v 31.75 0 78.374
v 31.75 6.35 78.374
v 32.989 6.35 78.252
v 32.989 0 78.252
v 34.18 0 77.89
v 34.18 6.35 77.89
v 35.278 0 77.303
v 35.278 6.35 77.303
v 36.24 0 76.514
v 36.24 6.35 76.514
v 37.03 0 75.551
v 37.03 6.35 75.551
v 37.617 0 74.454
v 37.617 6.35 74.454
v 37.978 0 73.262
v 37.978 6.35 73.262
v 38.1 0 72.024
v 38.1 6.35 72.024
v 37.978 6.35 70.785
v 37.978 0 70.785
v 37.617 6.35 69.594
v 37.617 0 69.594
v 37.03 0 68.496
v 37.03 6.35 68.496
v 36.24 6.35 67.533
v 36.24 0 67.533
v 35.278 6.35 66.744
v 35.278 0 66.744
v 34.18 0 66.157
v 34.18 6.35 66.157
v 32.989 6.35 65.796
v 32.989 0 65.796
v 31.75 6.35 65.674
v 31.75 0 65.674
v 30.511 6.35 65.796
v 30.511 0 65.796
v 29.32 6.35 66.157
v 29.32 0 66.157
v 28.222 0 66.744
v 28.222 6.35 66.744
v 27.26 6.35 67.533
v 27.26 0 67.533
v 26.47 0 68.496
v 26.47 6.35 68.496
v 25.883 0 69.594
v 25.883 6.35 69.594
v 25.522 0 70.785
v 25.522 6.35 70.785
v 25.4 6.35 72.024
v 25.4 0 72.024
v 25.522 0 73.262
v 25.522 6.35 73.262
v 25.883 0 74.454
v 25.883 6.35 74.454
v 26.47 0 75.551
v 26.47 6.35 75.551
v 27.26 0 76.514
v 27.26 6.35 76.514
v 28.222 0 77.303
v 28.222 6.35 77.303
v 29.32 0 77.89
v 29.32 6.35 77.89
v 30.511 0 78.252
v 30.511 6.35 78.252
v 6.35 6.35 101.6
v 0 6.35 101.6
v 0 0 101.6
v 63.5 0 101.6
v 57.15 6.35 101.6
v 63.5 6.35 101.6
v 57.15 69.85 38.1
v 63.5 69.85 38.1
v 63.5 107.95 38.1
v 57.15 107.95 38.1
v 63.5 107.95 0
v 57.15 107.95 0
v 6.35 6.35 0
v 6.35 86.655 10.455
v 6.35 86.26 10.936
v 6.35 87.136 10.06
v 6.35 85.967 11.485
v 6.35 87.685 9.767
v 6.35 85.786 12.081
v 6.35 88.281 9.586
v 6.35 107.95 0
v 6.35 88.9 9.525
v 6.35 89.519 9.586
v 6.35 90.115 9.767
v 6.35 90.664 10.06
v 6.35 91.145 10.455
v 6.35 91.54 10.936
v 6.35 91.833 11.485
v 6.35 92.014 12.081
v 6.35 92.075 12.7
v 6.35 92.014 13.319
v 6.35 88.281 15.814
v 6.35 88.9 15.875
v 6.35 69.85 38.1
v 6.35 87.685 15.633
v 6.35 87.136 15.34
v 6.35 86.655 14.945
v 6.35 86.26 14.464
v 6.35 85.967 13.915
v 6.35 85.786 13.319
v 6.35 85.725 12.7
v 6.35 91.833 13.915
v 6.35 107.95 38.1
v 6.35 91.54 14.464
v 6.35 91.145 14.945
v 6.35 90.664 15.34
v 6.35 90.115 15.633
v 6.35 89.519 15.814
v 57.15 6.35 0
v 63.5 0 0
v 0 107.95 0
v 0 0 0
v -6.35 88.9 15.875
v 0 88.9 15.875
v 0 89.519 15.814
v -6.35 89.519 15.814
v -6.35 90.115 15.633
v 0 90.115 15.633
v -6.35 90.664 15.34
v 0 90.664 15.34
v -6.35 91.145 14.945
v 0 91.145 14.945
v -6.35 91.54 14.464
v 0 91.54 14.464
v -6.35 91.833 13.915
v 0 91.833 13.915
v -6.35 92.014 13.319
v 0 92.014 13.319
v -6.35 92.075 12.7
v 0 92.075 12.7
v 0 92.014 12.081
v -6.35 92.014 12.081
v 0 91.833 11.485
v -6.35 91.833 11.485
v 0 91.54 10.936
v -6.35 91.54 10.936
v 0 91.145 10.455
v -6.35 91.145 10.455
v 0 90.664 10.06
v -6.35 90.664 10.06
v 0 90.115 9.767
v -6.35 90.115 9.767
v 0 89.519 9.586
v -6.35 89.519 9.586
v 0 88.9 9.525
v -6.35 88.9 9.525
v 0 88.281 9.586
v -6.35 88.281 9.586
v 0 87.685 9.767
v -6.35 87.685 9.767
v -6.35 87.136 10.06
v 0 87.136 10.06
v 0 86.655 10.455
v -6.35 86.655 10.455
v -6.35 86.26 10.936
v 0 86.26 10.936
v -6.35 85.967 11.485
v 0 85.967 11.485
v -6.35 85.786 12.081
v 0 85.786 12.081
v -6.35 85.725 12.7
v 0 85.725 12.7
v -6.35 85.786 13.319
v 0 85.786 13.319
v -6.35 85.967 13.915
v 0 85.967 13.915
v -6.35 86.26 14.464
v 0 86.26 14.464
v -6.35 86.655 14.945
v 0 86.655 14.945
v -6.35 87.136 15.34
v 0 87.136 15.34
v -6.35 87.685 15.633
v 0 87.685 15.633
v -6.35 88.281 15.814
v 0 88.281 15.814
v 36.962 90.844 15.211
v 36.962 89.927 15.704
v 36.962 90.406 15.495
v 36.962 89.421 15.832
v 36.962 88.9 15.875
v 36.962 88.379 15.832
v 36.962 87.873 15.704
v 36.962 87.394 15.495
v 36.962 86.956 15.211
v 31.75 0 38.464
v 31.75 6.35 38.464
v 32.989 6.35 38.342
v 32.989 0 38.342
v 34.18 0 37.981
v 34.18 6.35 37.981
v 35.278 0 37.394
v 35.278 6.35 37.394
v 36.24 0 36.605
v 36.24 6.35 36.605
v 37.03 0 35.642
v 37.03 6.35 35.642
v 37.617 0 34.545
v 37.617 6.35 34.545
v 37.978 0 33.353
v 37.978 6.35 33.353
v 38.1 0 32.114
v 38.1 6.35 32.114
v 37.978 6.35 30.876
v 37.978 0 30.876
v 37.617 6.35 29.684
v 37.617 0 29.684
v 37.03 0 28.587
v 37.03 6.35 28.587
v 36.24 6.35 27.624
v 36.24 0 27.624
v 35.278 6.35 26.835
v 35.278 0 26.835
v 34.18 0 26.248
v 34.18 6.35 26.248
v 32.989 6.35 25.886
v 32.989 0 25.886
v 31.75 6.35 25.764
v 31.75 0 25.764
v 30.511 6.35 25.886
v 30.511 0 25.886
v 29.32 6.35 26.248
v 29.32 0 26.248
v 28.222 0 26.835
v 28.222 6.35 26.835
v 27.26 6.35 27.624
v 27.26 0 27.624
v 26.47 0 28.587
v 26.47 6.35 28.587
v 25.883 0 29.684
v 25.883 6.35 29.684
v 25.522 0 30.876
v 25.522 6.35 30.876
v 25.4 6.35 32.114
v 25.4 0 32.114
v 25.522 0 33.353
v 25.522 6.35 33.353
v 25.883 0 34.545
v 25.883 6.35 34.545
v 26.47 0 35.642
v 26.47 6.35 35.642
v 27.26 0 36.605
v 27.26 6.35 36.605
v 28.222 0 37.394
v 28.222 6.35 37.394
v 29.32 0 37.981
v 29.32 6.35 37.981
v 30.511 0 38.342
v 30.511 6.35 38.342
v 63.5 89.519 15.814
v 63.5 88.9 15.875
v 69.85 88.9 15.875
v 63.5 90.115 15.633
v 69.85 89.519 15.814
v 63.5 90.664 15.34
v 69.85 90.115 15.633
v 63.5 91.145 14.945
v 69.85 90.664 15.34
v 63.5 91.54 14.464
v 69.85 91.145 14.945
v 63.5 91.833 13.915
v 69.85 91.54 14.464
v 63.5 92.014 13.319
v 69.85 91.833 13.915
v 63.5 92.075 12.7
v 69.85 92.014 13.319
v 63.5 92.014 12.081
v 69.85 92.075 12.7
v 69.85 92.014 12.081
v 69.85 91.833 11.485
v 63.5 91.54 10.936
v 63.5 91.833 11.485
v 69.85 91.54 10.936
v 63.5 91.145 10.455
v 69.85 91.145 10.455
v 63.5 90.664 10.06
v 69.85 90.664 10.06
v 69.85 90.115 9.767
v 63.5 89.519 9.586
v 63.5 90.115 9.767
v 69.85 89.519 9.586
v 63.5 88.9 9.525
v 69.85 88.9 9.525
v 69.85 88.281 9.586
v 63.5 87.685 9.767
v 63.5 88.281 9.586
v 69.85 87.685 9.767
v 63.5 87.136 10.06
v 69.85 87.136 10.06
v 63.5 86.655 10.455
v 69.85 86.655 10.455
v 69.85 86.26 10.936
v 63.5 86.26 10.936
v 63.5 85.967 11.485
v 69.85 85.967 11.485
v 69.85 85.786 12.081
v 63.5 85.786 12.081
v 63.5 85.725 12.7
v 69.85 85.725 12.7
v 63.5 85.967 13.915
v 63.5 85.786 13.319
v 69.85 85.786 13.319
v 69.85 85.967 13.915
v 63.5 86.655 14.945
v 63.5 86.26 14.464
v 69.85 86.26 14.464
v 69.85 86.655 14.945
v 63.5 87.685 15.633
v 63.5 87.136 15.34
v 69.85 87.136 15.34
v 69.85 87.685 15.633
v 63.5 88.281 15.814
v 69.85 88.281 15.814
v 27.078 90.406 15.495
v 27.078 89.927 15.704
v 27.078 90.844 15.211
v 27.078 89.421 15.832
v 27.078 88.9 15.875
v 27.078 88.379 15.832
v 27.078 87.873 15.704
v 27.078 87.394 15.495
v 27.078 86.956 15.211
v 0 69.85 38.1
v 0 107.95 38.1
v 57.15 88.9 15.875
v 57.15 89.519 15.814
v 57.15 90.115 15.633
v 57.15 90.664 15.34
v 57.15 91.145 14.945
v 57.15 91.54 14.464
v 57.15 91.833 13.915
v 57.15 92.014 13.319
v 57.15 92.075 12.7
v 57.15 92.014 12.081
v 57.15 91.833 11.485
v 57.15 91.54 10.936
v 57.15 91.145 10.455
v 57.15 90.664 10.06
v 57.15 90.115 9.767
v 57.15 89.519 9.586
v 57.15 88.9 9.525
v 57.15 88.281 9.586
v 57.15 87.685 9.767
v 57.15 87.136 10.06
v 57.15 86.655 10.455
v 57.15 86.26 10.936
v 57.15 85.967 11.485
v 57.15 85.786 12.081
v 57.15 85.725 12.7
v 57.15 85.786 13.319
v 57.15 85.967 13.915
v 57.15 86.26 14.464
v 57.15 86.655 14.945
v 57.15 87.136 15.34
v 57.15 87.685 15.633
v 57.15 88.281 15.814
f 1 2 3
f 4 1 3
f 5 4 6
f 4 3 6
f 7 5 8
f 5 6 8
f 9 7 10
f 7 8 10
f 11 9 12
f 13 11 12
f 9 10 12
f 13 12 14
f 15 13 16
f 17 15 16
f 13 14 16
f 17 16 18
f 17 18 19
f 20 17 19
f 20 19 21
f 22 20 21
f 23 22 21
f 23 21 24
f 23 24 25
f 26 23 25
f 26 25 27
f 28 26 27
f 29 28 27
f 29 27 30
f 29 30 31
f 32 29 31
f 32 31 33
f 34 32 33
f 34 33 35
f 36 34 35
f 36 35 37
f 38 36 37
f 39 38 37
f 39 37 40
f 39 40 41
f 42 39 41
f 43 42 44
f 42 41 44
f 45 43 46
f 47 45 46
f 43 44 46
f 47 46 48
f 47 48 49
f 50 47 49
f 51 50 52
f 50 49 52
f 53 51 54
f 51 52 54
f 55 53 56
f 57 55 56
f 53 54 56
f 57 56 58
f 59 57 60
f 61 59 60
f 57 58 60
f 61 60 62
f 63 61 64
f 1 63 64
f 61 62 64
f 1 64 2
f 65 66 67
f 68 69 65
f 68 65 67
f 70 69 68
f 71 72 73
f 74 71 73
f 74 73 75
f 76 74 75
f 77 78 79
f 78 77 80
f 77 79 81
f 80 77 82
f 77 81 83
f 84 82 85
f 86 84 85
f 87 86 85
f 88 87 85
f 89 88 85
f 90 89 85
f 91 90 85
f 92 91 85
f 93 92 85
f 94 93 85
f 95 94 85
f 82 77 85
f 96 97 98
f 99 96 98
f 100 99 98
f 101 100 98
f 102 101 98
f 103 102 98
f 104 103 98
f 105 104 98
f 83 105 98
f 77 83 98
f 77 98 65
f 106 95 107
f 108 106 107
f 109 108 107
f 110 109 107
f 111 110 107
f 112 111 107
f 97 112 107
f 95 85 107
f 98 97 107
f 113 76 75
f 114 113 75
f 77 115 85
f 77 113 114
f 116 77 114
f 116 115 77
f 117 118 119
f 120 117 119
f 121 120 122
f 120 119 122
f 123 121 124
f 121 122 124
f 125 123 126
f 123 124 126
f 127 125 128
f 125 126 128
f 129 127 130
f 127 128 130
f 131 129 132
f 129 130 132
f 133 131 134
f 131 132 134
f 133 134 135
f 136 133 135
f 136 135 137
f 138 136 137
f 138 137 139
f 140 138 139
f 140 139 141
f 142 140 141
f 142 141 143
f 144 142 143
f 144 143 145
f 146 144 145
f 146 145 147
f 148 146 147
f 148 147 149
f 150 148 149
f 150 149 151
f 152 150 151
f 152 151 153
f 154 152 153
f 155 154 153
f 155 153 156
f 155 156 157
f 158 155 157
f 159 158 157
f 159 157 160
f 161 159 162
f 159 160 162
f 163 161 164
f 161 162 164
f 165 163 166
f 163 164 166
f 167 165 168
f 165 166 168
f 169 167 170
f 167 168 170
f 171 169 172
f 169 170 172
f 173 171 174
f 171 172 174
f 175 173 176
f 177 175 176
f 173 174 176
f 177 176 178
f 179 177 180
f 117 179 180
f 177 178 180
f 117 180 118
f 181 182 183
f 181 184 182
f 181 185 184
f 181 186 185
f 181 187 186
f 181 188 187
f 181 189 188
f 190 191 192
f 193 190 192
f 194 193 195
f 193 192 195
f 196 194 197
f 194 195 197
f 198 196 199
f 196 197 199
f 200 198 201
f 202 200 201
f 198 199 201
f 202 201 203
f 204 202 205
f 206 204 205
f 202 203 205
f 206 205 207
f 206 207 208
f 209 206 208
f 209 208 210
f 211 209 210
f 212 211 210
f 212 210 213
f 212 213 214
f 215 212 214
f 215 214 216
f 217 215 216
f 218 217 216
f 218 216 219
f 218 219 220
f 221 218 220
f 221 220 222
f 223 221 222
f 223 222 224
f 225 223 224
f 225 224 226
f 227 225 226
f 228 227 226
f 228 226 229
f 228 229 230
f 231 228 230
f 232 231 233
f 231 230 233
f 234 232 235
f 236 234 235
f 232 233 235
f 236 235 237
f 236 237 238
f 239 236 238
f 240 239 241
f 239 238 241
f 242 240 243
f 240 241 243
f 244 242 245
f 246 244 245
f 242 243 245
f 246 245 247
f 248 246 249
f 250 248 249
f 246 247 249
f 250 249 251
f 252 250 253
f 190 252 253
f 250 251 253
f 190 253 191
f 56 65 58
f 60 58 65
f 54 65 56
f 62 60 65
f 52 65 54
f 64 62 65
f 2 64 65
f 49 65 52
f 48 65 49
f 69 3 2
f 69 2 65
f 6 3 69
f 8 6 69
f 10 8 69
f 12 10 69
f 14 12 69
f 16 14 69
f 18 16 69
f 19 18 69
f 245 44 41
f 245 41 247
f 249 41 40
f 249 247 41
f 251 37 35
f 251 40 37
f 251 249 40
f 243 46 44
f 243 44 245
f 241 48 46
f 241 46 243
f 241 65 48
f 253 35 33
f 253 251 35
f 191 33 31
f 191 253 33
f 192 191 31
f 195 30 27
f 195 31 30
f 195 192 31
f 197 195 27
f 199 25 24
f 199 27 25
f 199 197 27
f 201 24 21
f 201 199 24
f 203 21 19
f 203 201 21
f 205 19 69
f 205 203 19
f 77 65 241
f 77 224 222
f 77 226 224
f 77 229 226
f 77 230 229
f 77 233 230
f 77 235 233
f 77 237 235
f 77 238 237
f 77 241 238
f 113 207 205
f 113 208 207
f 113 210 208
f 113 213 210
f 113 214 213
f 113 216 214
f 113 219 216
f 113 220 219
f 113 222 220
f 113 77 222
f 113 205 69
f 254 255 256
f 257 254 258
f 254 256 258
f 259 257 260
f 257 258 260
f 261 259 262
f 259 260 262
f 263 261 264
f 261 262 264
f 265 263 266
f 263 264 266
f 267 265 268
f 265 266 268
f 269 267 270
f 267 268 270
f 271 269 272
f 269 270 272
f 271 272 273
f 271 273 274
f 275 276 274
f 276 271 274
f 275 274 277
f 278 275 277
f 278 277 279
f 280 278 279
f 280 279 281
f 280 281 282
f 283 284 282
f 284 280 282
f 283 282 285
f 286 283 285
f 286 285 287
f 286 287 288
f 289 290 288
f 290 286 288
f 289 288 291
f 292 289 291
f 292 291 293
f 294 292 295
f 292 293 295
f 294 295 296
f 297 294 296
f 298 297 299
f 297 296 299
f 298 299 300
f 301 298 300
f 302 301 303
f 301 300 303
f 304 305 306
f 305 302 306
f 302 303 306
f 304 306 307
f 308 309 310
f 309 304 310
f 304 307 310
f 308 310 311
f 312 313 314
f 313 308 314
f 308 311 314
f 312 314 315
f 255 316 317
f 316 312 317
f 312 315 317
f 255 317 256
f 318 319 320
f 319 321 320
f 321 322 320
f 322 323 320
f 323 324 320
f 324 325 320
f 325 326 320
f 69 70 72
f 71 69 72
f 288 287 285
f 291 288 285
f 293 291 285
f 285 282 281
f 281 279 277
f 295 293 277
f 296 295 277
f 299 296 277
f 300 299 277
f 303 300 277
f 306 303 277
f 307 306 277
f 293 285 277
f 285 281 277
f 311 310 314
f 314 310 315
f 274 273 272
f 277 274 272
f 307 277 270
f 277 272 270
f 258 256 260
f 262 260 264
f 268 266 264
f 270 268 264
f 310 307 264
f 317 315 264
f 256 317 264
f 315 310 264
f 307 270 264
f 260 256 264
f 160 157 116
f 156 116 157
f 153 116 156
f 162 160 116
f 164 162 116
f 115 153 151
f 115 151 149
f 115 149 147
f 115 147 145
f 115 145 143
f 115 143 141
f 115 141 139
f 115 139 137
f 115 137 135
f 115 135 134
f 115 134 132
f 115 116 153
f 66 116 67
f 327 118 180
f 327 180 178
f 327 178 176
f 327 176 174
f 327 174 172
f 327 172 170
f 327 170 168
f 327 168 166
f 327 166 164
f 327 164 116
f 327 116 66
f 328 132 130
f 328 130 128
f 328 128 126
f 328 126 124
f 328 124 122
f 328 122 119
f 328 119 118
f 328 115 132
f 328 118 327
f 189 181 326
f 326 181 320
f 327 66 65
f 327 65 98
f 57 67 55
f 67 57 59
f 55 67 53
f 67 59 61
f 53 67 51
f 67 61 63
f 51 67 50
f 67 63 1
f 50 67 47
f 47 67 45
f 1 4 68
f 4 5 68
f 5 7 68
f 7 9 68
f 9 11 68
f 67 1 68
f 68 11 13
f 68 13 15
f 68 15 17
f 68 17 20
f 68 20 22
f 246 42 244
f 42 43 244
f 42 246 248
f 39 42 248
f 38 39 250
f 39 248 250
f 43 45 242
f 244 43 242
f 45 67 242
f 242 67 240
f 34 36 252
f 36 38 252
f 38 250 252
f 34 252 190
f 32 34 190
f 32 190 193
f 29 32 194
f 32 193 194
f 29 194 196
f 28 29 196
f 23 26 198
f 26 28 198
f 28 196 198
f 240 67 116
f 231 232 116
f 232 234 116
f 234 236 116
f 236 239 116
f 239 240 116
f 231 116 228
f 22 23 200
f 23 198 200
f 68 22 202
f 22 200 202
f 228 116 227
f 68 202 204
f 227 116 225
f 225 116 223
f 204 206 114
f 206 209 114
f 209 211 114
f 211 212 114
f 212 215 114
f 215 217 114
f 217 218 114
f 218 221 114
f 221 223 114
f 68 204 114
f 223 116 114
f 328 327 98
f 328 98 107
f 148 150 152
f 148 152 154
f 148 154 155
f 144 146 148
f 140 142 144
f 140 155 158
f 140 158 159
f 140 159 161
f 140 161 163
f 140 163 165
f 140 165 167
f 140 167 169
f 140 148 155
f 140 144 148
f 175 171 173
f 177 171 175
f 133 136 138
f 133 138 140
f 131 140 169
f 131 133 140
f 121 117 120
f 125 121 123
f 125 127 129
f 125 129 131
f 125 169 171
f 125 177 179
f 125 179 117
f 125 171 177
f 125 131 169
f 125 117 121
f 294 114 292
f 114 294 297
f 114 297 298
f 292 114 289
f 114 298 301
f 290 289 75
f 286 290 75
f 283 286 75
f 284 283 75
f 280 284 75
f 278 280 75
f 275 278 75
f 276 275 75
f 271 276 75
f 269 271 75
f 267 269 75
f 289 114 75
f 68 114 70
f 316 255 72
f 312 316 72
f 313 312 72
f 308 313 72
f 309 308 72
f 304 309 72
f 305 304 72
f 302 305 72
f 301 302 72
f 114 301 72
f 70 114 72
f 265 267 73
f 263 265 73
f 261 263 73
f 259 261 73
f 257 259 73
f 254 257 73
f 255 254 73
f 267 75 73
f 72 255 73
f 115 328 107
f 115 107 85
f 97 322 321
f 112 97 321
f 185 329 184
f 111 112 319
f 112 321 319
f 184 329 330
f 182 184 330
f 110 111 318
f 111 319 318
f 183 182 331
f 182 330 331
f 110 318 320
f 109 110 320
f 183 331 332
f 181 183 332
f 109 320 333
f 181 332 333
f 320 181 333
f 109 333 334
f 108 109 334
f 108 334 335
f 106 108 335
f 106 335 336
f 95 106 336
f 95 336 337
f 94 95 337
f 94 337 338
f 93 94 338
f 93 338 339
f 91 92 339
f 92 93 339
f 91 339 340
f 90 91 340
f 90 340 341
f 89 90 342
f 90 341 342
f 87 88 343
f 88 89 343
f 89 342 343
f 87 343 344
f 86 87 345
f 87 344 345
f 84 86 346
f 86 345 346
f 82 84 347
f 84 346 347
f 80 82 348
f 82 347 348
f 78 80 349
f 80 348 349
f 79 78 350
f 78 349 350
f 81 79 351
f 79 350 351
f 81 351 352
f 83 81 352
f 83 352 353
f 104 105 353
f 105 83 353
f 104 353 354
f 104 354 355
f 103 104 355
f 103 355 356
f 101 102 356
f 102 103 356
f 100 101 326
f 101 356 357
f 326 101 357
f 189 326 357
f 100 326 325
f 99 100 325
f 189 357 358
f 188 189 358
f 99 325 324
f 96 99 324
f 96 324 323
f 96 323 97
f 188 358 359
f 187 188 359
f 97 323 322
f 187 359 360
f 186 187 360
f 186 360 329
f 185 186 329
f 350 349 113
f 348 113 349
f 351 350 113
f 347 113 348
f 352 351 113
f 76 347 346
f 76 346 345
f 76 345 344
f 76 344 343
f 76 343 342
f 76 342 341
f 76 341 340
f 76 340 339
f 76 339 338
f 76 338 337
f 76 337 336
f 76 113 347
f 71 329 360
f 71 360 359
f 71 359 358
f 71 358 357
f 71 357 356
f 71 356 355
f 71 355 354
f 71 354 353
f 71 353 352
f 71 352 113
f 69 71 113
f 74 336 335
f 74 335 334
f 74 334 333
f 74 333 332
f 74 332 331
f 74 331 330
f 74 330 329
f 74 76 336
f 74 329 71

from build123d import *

# Parameters (mm, degrees)
SKETCH2_W                = 63.5
SKETCH2_H                = 6.35
BASE_DEPTH               = 101.6
RIB_DEPTH                = 6.35
CUT_EXTRUDE1_DEPTH       = 159.876949241
CUT_EXTRUDE1_DEPTH_BACK  = 159.876949241
SKETCH5_R                = 3.175
BOSS_EXTRUDE1_DEPTH      = 63.5
BOSS_EXTRUDE1_DEPTH_BACK = 12.7
SKETCH5_2_R              = 3.175
CUT_EXTRUDE2_REACH       = 161.763
SKETCH6_R                = 6.35
SKETCH7_W                = 9.883303814
SKETCH7_H                = 2.121203366
CUT_EXTRUDE3_DEPTH       = 25.4


with BuildPart() as part:
    # Sketch2 → Base (new body)
    with BuildSketch(Plane.XY):
        with Locations((31.75, 3.175)):
            Rectangle(SKETCH2_W, SKETCH2_H)
    extrude(amount=BASE_DEPTH)

    # Sketch4 → Rib (add)
    with BuildSketch(Plane(origin=(63.5, 0, 0), x_dir=(0, 0, -1), z_dir=(1, 0, 0))):
        Polygon((0, 107.95), (0, 6.35), (-101.6, 6.35), (-38.1, 69.85), (-38.1, 107.95), align=None)
    rib = extrude(amount=-RIB_DEPTH)

    # RibCopy: Rib across plane
    add(rib.mirror(Plane.ZY.offset(-31.75)))

    # Sketch5 → Cut-Extrude1 (cut, two sides: drawn at the far end of the back side and taken through both)
    with BuildSketch(Plane.ZY.offset(-57.15).offset(-CUT_EXTRUDE1_DEPTH_BACK)):
        with Locations((12.7, 88.9)):
            Circle(SKETCH5_R)
    extrude(amount=CUT_EXTRUDE1_DEPTH + CUT_EXTRUDE1_DEPTH_BACK, mode=Mode.SUBTRACT)

    # Sketch5<2> → Boss-Extrude1 (add, two sides: drawn at the far end of the back side and taken through both)
    with BuildSketch(Plane.ZY.offset(-57.15).offset(-BOSS_EXTRUDE1_DEPTH_BACK)):
        with Locations((12.7, 88.9)):
            Circle(SKETCH5_2_R)
    extrude(amount=BOSS_EXTRUDE1_DEPTH + BOSS_EXTRUDE1_DEPTH_BACK)

    # Sketch6 → Cut-Extrude2 (cut, up to next)
    with BuildSketch(Plane(origin=(0, 6.35, 0), x_dir=(-1, 0, 0), z_dir=(0, 1, 0)), mode=Mode.PRIVATE) as cut_extrude2_sk1:
        with Locations((-31.75, 72.023550981)):
            Circle(SKETCH6_R)
    cut_extrude2_tool1 = extrude(cut_extrude2_sk1.sketch, amount=-CUT_EXTRUDE2_REACH, mode=Mode.PRIVATE) & part.part
    # Sketch6 → Cut-Extrude2 (cut, up to next)
    with BuildSketch(Plane(origin=(0, 6.35, 0), x_dir=(-1, 0, 0), z_dir=(0, 1, 0)), mode=Mode.PRIVATE) as cut_extrude2_sk2:
        with Locations((-31.75, 32.114477008)):
            Circle(SKETCH6_R)
    cut_extrude2_tool2 = extrude(cut_extrude2_sk2.sketch, amount=-CUT_EXTRUDE2_REACH, mode=Mode.PRIVATE) & part.part
    add(cut_extrude2_tool1.solids().sort_by_distance((31.75, 6.35, 72.023551))[0], mode=Mode.SUBTRACT)
    add(cut_extrude2_tool2.solids().sort_by_distance((31.75, 6.35, 32.114477))[0], mode=Mode.SUBTRACT)

    # Sketch7 → Cut-Extrude3 (cut)
    with BuildSketch(Plane(origin=(0, 107.95, 0), x_dir=(-1, 0, 0), z_dir=(0, 1, 0))):
        with Locations((-32.019903214, 16.271172427)):
            Rectangle(SKETCH7_W, SKETCH7_H)
    extrude(amount=-CUT_EXTRUDE3_DEPTH, mode=Mode.SUBTRACT)


solid = part.part
